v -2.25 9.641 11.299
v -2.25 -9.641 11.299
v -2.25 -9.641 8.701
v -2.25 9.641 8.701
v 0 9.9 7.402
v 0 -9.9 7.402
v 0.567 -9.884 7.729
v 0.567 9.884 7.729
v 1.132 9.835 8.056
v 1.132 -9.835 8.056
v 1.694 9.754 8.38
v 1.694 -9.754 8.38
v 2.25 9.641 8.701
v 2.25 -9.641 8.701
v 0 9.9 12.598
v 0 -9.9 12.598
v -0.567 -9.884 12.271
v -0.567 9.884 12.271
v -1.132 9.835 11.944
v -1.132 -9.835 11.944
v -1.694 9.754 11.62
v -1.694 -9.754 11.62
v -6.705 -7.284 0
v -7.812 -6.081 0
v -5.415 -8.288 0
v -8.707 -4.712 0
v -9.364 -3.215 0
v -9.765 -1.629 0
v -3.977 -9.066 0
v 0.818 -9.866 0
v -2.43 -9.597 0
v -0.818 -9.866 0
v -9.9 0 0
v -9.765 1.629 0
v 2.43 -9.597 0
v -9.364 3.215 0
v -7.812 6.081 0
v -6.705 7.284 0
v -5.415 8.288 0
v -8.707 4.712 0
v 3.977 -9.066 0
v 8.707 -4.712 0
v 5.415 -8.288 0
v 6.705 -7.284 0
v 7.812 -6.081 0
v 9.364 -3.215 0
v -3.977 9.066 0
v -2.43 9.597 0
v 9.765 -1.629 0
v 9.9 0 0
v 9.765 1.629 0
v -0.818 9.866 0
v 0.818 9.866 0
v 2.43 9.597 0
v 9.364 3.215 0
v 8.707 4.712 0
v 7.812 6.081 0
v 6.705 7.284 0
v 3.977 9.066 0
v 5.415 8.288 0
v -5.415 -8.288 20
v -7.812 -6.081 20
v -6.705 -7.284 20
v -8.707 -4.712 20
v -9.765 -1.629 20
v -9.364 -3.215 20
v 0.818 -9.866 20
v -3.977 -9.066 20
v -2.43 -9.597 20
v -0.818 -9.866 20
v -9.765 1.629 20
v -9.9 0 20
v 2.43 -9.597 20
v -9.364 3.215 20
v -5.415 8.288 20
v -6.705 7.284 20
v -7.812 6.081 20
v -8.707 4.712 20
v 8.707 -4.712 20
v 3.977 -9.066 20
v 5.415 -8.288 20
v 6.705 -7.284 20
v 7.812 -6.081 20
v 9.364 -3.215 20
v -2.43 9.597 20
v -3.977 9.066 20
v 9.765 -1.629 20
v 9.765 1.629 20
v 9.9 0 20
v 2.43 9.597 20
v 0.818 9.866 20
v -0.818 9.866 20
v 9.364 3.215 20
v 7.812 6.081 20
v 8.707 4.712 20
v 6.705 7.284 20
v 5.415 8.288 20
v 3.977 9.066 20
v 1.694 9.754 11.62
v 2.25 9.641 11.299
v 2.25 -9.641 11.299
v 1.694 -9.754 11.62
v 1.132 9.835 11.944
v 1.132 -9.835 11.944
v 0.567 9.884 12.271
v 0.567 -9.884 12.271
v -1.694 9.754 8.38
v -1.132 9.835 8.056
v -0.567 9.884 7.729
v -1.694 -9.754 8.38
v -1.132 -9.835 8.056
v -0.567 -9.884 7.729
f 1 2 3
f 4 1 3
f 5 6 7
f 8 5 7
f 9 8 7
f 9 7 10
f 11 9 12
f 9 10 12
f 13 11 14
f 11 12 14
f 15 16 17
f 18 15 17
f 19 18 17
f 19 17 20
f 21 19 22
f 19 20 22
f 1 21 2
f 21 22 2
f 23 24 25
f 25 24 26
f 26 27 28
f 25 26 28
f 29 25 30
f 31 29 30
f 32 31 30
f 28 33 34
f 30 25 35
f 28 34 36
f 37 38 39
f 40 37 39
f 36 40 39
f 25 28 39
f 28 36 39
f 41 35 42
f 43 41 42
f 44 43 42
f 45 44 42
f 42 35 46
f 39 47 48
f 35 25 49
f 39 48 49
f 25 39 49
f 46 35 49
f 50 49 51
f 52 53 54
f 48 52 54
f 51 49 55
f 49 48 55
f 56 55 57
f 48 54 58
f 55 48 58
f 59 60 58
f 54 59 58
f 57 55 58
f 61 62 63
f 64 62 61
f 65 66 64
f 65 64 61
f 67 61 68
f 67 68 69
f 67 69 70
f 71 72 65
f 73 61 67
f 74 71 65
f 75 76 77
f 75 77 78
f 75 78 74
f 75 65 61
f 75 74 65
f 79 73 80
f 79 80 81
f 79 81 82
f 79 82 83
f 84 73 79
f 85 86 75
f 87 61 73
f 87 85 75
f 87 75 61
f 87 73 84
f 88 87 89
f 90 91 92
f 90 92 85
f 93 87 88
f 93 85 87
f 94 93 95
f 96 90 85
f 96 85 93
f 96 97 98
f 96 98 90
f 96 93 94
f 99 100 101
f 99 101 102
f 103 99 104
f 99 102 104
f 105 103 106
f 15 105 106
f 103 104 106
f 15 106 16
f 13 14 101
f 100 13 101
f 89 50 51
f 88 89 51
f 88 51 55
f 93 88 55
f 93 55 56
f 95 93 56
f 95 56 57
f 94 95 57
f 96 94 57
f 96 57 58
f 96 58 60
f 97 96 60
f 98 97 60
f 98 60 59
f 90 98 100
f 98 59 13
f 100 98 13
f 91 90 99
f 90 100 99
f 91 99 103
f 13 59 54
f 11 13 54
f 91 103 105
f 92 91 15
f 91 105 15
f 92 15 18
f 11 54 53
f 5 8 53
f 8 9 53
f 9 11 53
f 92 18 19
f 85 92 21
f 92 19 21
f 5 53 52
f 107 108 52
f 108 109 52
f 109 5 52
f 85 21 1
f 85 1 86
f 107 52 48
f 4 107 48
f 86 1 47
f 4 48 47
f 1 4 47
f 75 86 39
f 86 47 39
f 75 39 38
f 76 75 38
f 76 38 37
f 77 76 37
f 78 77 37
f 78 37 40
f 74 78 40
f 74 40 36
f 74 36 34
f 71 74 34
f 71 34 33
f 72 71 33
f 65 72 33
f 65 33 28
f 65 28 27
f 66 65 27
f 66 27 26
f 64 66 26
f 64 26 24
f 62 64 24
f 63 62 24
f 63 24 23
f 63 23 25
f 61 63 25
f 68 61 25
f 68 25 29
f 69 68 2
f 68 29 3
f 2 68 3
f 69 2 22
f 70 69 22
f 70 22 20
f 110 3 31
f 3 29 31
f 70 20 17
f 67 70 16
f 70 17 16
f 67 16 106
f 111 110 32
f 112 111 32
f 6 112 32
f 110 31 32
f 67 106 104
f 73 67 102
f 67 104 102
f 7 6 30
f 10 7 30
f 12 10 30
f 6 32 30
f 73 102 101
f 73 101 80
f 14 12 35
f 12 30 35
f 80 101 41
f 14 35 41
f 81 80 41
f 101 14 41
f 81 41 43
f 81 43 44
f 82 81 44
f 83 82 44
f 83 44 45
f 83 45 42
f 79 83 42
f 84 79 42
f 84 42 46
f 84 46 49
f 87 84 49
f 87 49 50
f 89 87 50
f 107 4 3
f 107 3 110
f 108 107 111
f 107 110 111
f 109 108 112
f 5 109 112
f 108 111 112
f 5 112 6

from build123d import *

# Parameters (mm, degrees)
F0_R          = 9.9
F1_DEPTH      = 20
F3_DEPTH      = 9.901
F3_DEPTH_BACK = 9.901


with BuildPart() as f1:
    # F0 (on Top) → F1 (new body)
    with BuildSketch(Plane.XY):
        Circle(F0_R)
    extrude(amount=F1_DEPTH)

    # F2 (on Front) → F3 (cut, two sides)
    with BuildSketch(Plane.XZ) as f3_sk:
        Polygon((2.25, 8.7009618943), (2.25, 11.2990381057), (0, 12.5980762114), (-2.25, 11.2990381057), (-2.25, 8.7009618943), (0, 7.4019237886), align=None)
    extrude(amount=-F3_DEPTH, mode=Mode.SUBTRACT)
    extrude(f3_sk.sketch, amount=F3_DEPTH_BACK, mode=Mode.SUBTRACT)


solid = f1.part
